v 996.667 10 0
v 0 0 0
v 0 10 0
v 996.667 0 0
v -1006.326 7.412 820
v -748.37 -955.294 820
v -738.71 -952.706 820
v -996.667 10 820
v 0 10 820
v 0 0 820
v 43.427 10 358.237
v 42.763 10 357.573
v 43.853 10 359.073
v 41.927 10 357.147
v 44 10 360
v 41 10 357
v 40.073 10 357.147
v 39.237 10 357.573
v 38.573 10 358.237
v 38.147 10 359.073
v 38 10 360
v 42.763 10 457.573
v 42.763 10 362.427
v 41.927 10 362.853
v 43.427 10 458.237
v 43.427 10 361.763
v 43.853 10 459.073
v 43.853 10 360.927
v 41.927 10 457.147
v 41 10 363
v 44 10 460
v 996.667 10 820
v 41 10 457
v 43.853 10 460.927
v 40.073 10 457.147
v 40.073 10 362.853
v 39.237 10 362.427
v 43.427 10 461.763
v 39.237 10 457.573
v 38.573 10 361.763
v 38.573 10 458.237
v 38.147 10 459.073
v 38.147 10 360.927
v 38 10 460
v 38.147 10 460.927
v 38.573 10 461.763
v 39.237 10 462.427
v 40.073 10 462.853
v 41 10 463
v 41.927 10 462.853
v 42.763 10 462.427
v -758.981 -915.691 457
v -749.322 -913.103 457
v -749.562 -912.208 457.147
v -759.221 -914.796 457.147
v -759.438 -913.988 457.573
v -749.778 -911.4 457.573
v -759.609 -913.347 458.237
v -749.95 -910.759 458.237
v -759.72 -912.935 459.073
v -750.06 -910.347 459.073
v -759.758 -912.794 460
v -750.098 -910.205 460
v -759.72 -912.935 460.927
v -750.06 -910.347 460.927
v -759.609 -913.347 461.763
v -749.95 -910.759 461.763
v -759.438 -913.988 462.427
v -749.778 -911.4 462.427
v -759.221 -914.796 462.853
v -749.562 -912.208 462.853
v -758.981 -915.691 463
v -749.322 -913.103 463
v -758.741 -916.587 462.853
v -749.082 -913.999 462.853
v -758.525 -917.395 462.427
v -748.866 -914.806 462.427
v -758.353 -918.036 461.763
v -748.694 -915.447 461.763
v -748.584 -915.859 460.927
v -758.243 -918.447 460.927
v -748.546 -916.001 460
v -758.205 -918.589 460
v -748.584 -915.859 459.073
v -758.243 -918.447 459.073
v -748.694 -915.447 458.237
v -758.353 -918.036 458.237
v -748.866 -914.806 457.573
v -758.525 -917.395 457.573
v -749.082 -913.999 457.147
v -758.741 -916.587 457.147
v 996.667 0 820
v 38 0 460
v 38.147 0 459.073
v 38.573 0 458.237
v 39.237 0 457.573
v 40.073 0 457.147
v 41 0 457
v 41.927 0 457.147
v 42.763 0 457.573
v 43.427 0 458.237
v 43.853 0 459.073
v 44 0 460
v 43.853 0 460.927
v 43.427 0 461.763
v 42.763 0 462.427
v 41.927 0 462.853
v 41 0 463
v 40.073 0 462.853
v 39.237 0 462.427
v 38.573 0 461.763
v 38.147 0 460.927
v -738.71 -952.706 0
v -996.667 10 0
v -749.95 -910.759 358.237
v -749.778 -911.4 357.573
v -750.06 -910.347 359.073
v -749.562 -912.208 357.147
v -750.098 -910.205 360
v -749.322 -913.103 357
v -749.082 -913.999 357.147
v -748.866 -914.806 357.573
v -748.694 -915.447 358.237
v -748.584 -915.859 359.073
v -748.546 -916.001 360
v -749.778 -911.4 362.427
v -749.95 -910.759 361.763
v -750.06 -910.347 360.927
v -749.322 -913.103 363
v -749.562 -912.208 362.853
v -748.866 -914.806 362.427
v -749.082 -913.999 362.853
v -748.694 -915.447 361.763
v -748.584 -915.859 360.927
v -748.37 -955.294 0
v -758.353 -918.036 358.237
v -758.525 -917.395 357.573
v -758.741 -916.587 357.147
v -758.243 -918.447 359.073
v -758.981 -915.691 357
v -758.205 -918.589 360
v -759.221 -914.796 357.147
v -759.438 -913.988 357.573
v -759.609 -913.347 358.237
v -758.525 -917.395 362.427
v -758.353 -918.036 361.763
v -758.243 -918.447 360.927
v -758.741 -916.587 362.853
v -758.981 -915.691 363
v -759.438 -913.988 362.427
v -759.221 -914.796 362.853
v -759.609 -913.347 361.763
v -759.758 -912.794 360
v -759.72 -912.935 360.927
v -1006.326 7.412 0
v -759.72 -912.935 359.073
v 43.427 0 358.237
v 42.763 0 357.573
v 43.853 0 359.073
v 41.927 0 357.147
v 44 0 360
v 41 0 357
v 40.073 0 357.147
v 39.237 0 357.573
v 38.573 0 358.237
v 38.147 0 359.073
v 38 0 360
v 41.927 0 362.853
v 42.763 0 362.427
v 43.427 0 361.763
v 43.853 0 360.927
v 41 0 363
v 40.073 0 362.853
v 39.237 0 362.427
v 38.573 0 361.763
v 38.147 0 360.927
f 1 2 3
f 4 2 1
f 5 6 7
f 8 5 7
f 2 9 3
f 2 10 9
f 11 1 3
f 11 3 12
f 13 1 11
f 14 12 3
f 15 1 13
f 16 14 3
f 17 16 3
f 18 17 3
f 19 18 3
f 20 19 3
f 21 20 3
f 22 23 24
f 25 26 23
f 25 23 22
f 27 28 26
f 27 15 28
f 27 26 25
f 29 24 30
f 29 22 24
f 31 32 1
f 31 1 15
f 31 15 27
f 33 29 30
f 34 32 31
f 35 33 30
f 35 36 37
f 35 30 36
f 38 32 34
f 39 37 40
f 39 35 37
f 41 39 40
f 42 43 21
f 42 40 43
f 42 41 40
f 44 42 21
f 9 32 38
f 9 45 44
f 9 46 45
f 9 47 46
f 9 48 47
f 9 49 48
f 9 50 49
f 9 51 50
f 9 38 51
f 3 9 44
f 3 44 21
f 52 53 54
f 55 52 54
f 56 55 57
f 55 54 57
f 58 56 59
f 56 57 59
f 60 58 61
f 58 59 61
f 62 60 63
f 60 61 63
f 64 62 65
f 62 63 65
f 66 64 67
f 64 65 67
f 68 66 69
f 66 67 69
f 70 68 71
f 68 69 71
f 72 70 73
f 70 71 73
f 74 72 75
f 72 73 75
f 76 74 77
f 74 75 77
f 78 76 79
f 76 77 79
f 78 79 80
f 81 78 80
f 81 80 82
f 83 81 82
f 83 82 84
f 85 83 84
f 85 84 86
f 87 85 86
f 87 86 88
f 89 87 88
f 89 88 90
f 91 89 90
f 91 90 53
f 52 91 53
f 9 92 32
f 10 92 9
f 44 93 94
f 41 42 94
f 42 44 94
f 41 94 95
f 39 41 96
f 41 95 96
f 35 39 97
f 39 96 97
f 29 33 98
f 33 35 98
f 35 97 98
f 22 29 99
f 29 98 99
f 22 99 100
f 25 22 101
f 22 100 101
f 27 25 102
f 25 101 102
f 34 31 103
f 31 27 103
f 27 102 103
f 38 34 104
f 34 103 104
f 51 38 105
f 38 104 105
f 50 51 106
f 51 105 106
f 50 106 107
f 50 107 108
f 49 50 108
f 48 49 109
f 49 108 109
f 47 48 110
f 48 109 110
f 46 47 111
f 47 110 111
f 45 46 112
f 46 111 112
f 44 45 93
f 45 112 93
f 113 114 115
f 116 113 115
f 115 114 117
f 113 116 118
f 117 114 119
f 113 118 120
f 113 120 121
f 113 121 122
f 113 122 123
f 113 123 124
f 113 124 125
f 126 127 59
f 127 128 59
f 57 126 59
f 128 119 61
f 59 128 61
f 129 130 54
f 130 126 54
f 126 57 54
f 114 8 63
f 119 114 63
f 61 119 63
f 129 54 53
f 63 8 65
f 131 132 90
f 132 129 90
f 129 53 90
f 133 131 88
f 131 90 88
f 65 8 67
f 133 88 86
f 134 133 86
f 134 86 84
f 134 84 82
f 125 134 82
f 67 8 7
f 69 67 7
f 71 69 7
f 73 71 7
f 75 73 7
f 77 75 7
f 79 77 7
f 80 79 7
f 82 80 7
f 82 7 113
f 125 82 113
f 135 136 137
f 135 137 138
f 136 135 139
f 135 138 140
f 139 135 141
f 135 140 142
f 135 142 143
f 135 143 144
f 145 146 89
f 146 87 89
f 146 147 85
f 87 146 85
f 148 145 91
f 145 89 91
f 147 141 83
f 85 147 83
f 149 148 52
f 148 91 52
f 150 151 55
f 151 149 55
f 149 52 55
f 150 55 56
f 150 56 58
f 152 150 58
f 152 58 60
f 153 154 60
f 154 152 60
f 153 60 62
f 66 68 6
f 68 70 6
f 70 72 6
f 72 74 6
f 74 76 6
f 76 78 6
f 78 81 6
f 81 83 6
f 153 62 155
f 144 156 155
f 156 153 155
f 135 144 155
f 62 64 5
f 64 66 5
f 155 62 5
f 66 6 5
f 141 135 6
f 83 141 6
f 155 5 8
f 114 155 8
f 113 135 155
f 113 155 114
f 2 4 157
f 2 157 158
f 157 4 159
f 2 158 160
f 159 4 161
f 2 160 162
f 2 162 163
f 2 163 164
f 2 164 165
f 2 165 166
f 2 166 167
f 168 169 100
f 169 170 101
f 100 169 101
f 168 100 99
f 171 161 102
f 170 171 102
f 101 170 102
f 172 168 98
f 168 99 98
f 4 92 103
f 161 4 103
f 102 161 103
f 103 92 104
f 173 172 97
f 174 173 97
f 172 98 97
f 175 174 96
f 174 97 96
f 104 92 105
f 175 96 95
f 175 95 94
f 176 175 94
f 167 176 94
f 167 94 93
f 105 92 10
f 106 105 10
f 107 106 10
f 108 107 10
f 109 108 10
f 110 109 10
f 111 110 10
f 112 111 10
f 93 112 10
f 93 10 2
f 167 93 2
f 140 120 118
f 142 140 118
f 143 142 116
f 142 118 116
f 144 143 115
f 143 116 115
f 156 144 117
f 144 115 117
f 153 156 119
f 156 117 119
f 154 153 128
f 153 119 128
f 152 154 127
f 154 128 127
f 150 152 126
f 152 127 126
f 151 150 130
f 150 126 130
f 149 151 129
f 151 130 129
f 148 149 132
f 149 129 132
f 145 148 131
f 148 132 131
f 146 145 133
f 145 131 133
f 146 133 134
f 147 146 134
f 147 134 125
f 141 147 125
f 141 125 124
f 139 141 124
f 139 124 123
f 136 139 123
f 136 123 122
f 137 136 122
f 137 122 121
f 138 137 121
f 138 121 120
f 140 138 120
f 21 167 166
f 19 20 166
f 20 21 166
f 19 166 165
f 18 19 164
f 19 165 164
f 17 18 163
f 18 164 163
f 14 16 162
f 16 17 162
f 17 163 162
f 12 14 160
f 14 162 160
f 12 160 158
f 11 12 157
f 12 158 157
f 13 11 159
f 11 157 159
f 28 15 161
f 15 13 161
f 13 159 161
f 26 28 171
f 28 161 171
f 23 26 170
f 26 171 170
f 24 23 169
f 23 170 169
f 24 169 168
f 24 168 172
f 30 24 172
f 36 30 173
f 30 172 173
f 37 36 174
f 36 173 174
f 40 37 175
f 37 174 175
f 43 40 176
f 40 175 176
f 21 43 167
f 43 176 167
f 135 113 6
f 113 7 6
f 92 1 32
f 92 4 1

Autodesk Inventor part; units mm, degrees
ref_plane "YZ Plane" through (0, 0, 0) normal (1, 0, 0) x (0, 1, 0)
ref_plane "XZ Plane" through (0, 0, 0) normal (0, 1, 0) x (-1, 0, 0)
ref_plane "XY Plane" through (0, 0, 0) normal (0, 0, 1) x (1, 0, 0)
sketch "Sketch1" plane through (0, 0, 0) normal (0, 1, 0) x (-1, 0, 0)
  line L0 (0, 0) -> (-996.6667, 0)
  line L1 (-996.6667, 0) -> (-996.6667, 820)
  line L2 (-996.6667, 820) -> (0, 820)
  line L3 (0, 820) -> (0, 0)
  line L4 (0, 410) -> (-41, 410)
  line L5 (-41, 410) -> (-41, 460)
  line L6 (-41, 460) -> (-41, 360)
  circle A0 centre (-41, 460) radius 3
  circle A1 centre (-41, 360) radius 3
  dimension "ancho_m" = 996.6667
  dimension "h_inf" = 820
  dimension "d2" = 41
  dimension "d3" = 50
  dimension "d4" = 100
  dimension "d5" = 6
  dimension "d6" = 6
extrude "Extrusion1" add sketch "Sketch1" along normal blind 10
sketch "Boceto10" plane through (0, 0, 820) normal (0, 0, 1) x (1, 0, 0)
  line L0 (996.6667, 10) -> (0, 10) projected
  line L1 (0, 10) -> (-996.6667, 10)
  line L2 (-996.6667, 10) -> (-738.7104, -952.7061)
  line L3 (-996.6667, 10) -> (0, 10) construction
  line L4 (-738.7104, -952.7061) -> (-748.3696, -955.2943)
  line L5 (-748.3696, -955.2943) -> (-1006.3259, 7.4118)
  line L6 (-1006.3259, 7.4118) -> (-996.6667, 10)
  point P0 (0, 0)
  dimension "d49" = 996.6667
  dimension "d50" = 996.6667
  dimension "angulo" = 75
  dimension "d52" = 10
  dimension "d53" = 996.6667
extrude "Extrusión10" add sketch "Boceto10" against normal blind 820
sketch "Boceto11" plane through (-738.7104, -952.7061, 820) normal (0.9659258, 0.258819, 0) x (0, 0, -1)
  line L0 (0, 996.6667) -> (0, 0) projected
  line L1 (0, 0) -> (820, 0) projected
  line L2 (820, 996.6667) -> (820, 0) projected
  line L3 (0, 996.6667) -> (820, 996.6667) projected
  line L4 (0, 0) -> (820, 0) projected
  line L5 (410, 0) -> (410, 41)
  line L6 (410, 41) -> (360, 41)
  line L7 (360, 41) -> (460, 41)
  circle A0 centre (360, 41) radius 3
  circle A1 centre (460, 41) radius 3
  point P0 (820, 729.0511)
  dimension "d56" = 41
  dimension "d57" = 50
  dimension "d58" = 100
  dimension "d59" = 6
  dimension "d60" = 6
extrude "Extrusión11" cut sketch "Boceto11" against normal up to next contours A0 | A1
equation "\"d2\" = 0.05 * h_inf"
equation "\"d49\" = ancho_m"
equation "\"d50\" = ancho_m"
equation "\"d52\" = espesor"
equation "\"d53\" = ancho_m"
equation "\"d54\" = h_inf"
equation "\"d56\" = 0.05 * h_inf"
equation "\"d61\" = h_inf"
equation "\"espesor\" = 10"
properties part number "puerta_inf"
